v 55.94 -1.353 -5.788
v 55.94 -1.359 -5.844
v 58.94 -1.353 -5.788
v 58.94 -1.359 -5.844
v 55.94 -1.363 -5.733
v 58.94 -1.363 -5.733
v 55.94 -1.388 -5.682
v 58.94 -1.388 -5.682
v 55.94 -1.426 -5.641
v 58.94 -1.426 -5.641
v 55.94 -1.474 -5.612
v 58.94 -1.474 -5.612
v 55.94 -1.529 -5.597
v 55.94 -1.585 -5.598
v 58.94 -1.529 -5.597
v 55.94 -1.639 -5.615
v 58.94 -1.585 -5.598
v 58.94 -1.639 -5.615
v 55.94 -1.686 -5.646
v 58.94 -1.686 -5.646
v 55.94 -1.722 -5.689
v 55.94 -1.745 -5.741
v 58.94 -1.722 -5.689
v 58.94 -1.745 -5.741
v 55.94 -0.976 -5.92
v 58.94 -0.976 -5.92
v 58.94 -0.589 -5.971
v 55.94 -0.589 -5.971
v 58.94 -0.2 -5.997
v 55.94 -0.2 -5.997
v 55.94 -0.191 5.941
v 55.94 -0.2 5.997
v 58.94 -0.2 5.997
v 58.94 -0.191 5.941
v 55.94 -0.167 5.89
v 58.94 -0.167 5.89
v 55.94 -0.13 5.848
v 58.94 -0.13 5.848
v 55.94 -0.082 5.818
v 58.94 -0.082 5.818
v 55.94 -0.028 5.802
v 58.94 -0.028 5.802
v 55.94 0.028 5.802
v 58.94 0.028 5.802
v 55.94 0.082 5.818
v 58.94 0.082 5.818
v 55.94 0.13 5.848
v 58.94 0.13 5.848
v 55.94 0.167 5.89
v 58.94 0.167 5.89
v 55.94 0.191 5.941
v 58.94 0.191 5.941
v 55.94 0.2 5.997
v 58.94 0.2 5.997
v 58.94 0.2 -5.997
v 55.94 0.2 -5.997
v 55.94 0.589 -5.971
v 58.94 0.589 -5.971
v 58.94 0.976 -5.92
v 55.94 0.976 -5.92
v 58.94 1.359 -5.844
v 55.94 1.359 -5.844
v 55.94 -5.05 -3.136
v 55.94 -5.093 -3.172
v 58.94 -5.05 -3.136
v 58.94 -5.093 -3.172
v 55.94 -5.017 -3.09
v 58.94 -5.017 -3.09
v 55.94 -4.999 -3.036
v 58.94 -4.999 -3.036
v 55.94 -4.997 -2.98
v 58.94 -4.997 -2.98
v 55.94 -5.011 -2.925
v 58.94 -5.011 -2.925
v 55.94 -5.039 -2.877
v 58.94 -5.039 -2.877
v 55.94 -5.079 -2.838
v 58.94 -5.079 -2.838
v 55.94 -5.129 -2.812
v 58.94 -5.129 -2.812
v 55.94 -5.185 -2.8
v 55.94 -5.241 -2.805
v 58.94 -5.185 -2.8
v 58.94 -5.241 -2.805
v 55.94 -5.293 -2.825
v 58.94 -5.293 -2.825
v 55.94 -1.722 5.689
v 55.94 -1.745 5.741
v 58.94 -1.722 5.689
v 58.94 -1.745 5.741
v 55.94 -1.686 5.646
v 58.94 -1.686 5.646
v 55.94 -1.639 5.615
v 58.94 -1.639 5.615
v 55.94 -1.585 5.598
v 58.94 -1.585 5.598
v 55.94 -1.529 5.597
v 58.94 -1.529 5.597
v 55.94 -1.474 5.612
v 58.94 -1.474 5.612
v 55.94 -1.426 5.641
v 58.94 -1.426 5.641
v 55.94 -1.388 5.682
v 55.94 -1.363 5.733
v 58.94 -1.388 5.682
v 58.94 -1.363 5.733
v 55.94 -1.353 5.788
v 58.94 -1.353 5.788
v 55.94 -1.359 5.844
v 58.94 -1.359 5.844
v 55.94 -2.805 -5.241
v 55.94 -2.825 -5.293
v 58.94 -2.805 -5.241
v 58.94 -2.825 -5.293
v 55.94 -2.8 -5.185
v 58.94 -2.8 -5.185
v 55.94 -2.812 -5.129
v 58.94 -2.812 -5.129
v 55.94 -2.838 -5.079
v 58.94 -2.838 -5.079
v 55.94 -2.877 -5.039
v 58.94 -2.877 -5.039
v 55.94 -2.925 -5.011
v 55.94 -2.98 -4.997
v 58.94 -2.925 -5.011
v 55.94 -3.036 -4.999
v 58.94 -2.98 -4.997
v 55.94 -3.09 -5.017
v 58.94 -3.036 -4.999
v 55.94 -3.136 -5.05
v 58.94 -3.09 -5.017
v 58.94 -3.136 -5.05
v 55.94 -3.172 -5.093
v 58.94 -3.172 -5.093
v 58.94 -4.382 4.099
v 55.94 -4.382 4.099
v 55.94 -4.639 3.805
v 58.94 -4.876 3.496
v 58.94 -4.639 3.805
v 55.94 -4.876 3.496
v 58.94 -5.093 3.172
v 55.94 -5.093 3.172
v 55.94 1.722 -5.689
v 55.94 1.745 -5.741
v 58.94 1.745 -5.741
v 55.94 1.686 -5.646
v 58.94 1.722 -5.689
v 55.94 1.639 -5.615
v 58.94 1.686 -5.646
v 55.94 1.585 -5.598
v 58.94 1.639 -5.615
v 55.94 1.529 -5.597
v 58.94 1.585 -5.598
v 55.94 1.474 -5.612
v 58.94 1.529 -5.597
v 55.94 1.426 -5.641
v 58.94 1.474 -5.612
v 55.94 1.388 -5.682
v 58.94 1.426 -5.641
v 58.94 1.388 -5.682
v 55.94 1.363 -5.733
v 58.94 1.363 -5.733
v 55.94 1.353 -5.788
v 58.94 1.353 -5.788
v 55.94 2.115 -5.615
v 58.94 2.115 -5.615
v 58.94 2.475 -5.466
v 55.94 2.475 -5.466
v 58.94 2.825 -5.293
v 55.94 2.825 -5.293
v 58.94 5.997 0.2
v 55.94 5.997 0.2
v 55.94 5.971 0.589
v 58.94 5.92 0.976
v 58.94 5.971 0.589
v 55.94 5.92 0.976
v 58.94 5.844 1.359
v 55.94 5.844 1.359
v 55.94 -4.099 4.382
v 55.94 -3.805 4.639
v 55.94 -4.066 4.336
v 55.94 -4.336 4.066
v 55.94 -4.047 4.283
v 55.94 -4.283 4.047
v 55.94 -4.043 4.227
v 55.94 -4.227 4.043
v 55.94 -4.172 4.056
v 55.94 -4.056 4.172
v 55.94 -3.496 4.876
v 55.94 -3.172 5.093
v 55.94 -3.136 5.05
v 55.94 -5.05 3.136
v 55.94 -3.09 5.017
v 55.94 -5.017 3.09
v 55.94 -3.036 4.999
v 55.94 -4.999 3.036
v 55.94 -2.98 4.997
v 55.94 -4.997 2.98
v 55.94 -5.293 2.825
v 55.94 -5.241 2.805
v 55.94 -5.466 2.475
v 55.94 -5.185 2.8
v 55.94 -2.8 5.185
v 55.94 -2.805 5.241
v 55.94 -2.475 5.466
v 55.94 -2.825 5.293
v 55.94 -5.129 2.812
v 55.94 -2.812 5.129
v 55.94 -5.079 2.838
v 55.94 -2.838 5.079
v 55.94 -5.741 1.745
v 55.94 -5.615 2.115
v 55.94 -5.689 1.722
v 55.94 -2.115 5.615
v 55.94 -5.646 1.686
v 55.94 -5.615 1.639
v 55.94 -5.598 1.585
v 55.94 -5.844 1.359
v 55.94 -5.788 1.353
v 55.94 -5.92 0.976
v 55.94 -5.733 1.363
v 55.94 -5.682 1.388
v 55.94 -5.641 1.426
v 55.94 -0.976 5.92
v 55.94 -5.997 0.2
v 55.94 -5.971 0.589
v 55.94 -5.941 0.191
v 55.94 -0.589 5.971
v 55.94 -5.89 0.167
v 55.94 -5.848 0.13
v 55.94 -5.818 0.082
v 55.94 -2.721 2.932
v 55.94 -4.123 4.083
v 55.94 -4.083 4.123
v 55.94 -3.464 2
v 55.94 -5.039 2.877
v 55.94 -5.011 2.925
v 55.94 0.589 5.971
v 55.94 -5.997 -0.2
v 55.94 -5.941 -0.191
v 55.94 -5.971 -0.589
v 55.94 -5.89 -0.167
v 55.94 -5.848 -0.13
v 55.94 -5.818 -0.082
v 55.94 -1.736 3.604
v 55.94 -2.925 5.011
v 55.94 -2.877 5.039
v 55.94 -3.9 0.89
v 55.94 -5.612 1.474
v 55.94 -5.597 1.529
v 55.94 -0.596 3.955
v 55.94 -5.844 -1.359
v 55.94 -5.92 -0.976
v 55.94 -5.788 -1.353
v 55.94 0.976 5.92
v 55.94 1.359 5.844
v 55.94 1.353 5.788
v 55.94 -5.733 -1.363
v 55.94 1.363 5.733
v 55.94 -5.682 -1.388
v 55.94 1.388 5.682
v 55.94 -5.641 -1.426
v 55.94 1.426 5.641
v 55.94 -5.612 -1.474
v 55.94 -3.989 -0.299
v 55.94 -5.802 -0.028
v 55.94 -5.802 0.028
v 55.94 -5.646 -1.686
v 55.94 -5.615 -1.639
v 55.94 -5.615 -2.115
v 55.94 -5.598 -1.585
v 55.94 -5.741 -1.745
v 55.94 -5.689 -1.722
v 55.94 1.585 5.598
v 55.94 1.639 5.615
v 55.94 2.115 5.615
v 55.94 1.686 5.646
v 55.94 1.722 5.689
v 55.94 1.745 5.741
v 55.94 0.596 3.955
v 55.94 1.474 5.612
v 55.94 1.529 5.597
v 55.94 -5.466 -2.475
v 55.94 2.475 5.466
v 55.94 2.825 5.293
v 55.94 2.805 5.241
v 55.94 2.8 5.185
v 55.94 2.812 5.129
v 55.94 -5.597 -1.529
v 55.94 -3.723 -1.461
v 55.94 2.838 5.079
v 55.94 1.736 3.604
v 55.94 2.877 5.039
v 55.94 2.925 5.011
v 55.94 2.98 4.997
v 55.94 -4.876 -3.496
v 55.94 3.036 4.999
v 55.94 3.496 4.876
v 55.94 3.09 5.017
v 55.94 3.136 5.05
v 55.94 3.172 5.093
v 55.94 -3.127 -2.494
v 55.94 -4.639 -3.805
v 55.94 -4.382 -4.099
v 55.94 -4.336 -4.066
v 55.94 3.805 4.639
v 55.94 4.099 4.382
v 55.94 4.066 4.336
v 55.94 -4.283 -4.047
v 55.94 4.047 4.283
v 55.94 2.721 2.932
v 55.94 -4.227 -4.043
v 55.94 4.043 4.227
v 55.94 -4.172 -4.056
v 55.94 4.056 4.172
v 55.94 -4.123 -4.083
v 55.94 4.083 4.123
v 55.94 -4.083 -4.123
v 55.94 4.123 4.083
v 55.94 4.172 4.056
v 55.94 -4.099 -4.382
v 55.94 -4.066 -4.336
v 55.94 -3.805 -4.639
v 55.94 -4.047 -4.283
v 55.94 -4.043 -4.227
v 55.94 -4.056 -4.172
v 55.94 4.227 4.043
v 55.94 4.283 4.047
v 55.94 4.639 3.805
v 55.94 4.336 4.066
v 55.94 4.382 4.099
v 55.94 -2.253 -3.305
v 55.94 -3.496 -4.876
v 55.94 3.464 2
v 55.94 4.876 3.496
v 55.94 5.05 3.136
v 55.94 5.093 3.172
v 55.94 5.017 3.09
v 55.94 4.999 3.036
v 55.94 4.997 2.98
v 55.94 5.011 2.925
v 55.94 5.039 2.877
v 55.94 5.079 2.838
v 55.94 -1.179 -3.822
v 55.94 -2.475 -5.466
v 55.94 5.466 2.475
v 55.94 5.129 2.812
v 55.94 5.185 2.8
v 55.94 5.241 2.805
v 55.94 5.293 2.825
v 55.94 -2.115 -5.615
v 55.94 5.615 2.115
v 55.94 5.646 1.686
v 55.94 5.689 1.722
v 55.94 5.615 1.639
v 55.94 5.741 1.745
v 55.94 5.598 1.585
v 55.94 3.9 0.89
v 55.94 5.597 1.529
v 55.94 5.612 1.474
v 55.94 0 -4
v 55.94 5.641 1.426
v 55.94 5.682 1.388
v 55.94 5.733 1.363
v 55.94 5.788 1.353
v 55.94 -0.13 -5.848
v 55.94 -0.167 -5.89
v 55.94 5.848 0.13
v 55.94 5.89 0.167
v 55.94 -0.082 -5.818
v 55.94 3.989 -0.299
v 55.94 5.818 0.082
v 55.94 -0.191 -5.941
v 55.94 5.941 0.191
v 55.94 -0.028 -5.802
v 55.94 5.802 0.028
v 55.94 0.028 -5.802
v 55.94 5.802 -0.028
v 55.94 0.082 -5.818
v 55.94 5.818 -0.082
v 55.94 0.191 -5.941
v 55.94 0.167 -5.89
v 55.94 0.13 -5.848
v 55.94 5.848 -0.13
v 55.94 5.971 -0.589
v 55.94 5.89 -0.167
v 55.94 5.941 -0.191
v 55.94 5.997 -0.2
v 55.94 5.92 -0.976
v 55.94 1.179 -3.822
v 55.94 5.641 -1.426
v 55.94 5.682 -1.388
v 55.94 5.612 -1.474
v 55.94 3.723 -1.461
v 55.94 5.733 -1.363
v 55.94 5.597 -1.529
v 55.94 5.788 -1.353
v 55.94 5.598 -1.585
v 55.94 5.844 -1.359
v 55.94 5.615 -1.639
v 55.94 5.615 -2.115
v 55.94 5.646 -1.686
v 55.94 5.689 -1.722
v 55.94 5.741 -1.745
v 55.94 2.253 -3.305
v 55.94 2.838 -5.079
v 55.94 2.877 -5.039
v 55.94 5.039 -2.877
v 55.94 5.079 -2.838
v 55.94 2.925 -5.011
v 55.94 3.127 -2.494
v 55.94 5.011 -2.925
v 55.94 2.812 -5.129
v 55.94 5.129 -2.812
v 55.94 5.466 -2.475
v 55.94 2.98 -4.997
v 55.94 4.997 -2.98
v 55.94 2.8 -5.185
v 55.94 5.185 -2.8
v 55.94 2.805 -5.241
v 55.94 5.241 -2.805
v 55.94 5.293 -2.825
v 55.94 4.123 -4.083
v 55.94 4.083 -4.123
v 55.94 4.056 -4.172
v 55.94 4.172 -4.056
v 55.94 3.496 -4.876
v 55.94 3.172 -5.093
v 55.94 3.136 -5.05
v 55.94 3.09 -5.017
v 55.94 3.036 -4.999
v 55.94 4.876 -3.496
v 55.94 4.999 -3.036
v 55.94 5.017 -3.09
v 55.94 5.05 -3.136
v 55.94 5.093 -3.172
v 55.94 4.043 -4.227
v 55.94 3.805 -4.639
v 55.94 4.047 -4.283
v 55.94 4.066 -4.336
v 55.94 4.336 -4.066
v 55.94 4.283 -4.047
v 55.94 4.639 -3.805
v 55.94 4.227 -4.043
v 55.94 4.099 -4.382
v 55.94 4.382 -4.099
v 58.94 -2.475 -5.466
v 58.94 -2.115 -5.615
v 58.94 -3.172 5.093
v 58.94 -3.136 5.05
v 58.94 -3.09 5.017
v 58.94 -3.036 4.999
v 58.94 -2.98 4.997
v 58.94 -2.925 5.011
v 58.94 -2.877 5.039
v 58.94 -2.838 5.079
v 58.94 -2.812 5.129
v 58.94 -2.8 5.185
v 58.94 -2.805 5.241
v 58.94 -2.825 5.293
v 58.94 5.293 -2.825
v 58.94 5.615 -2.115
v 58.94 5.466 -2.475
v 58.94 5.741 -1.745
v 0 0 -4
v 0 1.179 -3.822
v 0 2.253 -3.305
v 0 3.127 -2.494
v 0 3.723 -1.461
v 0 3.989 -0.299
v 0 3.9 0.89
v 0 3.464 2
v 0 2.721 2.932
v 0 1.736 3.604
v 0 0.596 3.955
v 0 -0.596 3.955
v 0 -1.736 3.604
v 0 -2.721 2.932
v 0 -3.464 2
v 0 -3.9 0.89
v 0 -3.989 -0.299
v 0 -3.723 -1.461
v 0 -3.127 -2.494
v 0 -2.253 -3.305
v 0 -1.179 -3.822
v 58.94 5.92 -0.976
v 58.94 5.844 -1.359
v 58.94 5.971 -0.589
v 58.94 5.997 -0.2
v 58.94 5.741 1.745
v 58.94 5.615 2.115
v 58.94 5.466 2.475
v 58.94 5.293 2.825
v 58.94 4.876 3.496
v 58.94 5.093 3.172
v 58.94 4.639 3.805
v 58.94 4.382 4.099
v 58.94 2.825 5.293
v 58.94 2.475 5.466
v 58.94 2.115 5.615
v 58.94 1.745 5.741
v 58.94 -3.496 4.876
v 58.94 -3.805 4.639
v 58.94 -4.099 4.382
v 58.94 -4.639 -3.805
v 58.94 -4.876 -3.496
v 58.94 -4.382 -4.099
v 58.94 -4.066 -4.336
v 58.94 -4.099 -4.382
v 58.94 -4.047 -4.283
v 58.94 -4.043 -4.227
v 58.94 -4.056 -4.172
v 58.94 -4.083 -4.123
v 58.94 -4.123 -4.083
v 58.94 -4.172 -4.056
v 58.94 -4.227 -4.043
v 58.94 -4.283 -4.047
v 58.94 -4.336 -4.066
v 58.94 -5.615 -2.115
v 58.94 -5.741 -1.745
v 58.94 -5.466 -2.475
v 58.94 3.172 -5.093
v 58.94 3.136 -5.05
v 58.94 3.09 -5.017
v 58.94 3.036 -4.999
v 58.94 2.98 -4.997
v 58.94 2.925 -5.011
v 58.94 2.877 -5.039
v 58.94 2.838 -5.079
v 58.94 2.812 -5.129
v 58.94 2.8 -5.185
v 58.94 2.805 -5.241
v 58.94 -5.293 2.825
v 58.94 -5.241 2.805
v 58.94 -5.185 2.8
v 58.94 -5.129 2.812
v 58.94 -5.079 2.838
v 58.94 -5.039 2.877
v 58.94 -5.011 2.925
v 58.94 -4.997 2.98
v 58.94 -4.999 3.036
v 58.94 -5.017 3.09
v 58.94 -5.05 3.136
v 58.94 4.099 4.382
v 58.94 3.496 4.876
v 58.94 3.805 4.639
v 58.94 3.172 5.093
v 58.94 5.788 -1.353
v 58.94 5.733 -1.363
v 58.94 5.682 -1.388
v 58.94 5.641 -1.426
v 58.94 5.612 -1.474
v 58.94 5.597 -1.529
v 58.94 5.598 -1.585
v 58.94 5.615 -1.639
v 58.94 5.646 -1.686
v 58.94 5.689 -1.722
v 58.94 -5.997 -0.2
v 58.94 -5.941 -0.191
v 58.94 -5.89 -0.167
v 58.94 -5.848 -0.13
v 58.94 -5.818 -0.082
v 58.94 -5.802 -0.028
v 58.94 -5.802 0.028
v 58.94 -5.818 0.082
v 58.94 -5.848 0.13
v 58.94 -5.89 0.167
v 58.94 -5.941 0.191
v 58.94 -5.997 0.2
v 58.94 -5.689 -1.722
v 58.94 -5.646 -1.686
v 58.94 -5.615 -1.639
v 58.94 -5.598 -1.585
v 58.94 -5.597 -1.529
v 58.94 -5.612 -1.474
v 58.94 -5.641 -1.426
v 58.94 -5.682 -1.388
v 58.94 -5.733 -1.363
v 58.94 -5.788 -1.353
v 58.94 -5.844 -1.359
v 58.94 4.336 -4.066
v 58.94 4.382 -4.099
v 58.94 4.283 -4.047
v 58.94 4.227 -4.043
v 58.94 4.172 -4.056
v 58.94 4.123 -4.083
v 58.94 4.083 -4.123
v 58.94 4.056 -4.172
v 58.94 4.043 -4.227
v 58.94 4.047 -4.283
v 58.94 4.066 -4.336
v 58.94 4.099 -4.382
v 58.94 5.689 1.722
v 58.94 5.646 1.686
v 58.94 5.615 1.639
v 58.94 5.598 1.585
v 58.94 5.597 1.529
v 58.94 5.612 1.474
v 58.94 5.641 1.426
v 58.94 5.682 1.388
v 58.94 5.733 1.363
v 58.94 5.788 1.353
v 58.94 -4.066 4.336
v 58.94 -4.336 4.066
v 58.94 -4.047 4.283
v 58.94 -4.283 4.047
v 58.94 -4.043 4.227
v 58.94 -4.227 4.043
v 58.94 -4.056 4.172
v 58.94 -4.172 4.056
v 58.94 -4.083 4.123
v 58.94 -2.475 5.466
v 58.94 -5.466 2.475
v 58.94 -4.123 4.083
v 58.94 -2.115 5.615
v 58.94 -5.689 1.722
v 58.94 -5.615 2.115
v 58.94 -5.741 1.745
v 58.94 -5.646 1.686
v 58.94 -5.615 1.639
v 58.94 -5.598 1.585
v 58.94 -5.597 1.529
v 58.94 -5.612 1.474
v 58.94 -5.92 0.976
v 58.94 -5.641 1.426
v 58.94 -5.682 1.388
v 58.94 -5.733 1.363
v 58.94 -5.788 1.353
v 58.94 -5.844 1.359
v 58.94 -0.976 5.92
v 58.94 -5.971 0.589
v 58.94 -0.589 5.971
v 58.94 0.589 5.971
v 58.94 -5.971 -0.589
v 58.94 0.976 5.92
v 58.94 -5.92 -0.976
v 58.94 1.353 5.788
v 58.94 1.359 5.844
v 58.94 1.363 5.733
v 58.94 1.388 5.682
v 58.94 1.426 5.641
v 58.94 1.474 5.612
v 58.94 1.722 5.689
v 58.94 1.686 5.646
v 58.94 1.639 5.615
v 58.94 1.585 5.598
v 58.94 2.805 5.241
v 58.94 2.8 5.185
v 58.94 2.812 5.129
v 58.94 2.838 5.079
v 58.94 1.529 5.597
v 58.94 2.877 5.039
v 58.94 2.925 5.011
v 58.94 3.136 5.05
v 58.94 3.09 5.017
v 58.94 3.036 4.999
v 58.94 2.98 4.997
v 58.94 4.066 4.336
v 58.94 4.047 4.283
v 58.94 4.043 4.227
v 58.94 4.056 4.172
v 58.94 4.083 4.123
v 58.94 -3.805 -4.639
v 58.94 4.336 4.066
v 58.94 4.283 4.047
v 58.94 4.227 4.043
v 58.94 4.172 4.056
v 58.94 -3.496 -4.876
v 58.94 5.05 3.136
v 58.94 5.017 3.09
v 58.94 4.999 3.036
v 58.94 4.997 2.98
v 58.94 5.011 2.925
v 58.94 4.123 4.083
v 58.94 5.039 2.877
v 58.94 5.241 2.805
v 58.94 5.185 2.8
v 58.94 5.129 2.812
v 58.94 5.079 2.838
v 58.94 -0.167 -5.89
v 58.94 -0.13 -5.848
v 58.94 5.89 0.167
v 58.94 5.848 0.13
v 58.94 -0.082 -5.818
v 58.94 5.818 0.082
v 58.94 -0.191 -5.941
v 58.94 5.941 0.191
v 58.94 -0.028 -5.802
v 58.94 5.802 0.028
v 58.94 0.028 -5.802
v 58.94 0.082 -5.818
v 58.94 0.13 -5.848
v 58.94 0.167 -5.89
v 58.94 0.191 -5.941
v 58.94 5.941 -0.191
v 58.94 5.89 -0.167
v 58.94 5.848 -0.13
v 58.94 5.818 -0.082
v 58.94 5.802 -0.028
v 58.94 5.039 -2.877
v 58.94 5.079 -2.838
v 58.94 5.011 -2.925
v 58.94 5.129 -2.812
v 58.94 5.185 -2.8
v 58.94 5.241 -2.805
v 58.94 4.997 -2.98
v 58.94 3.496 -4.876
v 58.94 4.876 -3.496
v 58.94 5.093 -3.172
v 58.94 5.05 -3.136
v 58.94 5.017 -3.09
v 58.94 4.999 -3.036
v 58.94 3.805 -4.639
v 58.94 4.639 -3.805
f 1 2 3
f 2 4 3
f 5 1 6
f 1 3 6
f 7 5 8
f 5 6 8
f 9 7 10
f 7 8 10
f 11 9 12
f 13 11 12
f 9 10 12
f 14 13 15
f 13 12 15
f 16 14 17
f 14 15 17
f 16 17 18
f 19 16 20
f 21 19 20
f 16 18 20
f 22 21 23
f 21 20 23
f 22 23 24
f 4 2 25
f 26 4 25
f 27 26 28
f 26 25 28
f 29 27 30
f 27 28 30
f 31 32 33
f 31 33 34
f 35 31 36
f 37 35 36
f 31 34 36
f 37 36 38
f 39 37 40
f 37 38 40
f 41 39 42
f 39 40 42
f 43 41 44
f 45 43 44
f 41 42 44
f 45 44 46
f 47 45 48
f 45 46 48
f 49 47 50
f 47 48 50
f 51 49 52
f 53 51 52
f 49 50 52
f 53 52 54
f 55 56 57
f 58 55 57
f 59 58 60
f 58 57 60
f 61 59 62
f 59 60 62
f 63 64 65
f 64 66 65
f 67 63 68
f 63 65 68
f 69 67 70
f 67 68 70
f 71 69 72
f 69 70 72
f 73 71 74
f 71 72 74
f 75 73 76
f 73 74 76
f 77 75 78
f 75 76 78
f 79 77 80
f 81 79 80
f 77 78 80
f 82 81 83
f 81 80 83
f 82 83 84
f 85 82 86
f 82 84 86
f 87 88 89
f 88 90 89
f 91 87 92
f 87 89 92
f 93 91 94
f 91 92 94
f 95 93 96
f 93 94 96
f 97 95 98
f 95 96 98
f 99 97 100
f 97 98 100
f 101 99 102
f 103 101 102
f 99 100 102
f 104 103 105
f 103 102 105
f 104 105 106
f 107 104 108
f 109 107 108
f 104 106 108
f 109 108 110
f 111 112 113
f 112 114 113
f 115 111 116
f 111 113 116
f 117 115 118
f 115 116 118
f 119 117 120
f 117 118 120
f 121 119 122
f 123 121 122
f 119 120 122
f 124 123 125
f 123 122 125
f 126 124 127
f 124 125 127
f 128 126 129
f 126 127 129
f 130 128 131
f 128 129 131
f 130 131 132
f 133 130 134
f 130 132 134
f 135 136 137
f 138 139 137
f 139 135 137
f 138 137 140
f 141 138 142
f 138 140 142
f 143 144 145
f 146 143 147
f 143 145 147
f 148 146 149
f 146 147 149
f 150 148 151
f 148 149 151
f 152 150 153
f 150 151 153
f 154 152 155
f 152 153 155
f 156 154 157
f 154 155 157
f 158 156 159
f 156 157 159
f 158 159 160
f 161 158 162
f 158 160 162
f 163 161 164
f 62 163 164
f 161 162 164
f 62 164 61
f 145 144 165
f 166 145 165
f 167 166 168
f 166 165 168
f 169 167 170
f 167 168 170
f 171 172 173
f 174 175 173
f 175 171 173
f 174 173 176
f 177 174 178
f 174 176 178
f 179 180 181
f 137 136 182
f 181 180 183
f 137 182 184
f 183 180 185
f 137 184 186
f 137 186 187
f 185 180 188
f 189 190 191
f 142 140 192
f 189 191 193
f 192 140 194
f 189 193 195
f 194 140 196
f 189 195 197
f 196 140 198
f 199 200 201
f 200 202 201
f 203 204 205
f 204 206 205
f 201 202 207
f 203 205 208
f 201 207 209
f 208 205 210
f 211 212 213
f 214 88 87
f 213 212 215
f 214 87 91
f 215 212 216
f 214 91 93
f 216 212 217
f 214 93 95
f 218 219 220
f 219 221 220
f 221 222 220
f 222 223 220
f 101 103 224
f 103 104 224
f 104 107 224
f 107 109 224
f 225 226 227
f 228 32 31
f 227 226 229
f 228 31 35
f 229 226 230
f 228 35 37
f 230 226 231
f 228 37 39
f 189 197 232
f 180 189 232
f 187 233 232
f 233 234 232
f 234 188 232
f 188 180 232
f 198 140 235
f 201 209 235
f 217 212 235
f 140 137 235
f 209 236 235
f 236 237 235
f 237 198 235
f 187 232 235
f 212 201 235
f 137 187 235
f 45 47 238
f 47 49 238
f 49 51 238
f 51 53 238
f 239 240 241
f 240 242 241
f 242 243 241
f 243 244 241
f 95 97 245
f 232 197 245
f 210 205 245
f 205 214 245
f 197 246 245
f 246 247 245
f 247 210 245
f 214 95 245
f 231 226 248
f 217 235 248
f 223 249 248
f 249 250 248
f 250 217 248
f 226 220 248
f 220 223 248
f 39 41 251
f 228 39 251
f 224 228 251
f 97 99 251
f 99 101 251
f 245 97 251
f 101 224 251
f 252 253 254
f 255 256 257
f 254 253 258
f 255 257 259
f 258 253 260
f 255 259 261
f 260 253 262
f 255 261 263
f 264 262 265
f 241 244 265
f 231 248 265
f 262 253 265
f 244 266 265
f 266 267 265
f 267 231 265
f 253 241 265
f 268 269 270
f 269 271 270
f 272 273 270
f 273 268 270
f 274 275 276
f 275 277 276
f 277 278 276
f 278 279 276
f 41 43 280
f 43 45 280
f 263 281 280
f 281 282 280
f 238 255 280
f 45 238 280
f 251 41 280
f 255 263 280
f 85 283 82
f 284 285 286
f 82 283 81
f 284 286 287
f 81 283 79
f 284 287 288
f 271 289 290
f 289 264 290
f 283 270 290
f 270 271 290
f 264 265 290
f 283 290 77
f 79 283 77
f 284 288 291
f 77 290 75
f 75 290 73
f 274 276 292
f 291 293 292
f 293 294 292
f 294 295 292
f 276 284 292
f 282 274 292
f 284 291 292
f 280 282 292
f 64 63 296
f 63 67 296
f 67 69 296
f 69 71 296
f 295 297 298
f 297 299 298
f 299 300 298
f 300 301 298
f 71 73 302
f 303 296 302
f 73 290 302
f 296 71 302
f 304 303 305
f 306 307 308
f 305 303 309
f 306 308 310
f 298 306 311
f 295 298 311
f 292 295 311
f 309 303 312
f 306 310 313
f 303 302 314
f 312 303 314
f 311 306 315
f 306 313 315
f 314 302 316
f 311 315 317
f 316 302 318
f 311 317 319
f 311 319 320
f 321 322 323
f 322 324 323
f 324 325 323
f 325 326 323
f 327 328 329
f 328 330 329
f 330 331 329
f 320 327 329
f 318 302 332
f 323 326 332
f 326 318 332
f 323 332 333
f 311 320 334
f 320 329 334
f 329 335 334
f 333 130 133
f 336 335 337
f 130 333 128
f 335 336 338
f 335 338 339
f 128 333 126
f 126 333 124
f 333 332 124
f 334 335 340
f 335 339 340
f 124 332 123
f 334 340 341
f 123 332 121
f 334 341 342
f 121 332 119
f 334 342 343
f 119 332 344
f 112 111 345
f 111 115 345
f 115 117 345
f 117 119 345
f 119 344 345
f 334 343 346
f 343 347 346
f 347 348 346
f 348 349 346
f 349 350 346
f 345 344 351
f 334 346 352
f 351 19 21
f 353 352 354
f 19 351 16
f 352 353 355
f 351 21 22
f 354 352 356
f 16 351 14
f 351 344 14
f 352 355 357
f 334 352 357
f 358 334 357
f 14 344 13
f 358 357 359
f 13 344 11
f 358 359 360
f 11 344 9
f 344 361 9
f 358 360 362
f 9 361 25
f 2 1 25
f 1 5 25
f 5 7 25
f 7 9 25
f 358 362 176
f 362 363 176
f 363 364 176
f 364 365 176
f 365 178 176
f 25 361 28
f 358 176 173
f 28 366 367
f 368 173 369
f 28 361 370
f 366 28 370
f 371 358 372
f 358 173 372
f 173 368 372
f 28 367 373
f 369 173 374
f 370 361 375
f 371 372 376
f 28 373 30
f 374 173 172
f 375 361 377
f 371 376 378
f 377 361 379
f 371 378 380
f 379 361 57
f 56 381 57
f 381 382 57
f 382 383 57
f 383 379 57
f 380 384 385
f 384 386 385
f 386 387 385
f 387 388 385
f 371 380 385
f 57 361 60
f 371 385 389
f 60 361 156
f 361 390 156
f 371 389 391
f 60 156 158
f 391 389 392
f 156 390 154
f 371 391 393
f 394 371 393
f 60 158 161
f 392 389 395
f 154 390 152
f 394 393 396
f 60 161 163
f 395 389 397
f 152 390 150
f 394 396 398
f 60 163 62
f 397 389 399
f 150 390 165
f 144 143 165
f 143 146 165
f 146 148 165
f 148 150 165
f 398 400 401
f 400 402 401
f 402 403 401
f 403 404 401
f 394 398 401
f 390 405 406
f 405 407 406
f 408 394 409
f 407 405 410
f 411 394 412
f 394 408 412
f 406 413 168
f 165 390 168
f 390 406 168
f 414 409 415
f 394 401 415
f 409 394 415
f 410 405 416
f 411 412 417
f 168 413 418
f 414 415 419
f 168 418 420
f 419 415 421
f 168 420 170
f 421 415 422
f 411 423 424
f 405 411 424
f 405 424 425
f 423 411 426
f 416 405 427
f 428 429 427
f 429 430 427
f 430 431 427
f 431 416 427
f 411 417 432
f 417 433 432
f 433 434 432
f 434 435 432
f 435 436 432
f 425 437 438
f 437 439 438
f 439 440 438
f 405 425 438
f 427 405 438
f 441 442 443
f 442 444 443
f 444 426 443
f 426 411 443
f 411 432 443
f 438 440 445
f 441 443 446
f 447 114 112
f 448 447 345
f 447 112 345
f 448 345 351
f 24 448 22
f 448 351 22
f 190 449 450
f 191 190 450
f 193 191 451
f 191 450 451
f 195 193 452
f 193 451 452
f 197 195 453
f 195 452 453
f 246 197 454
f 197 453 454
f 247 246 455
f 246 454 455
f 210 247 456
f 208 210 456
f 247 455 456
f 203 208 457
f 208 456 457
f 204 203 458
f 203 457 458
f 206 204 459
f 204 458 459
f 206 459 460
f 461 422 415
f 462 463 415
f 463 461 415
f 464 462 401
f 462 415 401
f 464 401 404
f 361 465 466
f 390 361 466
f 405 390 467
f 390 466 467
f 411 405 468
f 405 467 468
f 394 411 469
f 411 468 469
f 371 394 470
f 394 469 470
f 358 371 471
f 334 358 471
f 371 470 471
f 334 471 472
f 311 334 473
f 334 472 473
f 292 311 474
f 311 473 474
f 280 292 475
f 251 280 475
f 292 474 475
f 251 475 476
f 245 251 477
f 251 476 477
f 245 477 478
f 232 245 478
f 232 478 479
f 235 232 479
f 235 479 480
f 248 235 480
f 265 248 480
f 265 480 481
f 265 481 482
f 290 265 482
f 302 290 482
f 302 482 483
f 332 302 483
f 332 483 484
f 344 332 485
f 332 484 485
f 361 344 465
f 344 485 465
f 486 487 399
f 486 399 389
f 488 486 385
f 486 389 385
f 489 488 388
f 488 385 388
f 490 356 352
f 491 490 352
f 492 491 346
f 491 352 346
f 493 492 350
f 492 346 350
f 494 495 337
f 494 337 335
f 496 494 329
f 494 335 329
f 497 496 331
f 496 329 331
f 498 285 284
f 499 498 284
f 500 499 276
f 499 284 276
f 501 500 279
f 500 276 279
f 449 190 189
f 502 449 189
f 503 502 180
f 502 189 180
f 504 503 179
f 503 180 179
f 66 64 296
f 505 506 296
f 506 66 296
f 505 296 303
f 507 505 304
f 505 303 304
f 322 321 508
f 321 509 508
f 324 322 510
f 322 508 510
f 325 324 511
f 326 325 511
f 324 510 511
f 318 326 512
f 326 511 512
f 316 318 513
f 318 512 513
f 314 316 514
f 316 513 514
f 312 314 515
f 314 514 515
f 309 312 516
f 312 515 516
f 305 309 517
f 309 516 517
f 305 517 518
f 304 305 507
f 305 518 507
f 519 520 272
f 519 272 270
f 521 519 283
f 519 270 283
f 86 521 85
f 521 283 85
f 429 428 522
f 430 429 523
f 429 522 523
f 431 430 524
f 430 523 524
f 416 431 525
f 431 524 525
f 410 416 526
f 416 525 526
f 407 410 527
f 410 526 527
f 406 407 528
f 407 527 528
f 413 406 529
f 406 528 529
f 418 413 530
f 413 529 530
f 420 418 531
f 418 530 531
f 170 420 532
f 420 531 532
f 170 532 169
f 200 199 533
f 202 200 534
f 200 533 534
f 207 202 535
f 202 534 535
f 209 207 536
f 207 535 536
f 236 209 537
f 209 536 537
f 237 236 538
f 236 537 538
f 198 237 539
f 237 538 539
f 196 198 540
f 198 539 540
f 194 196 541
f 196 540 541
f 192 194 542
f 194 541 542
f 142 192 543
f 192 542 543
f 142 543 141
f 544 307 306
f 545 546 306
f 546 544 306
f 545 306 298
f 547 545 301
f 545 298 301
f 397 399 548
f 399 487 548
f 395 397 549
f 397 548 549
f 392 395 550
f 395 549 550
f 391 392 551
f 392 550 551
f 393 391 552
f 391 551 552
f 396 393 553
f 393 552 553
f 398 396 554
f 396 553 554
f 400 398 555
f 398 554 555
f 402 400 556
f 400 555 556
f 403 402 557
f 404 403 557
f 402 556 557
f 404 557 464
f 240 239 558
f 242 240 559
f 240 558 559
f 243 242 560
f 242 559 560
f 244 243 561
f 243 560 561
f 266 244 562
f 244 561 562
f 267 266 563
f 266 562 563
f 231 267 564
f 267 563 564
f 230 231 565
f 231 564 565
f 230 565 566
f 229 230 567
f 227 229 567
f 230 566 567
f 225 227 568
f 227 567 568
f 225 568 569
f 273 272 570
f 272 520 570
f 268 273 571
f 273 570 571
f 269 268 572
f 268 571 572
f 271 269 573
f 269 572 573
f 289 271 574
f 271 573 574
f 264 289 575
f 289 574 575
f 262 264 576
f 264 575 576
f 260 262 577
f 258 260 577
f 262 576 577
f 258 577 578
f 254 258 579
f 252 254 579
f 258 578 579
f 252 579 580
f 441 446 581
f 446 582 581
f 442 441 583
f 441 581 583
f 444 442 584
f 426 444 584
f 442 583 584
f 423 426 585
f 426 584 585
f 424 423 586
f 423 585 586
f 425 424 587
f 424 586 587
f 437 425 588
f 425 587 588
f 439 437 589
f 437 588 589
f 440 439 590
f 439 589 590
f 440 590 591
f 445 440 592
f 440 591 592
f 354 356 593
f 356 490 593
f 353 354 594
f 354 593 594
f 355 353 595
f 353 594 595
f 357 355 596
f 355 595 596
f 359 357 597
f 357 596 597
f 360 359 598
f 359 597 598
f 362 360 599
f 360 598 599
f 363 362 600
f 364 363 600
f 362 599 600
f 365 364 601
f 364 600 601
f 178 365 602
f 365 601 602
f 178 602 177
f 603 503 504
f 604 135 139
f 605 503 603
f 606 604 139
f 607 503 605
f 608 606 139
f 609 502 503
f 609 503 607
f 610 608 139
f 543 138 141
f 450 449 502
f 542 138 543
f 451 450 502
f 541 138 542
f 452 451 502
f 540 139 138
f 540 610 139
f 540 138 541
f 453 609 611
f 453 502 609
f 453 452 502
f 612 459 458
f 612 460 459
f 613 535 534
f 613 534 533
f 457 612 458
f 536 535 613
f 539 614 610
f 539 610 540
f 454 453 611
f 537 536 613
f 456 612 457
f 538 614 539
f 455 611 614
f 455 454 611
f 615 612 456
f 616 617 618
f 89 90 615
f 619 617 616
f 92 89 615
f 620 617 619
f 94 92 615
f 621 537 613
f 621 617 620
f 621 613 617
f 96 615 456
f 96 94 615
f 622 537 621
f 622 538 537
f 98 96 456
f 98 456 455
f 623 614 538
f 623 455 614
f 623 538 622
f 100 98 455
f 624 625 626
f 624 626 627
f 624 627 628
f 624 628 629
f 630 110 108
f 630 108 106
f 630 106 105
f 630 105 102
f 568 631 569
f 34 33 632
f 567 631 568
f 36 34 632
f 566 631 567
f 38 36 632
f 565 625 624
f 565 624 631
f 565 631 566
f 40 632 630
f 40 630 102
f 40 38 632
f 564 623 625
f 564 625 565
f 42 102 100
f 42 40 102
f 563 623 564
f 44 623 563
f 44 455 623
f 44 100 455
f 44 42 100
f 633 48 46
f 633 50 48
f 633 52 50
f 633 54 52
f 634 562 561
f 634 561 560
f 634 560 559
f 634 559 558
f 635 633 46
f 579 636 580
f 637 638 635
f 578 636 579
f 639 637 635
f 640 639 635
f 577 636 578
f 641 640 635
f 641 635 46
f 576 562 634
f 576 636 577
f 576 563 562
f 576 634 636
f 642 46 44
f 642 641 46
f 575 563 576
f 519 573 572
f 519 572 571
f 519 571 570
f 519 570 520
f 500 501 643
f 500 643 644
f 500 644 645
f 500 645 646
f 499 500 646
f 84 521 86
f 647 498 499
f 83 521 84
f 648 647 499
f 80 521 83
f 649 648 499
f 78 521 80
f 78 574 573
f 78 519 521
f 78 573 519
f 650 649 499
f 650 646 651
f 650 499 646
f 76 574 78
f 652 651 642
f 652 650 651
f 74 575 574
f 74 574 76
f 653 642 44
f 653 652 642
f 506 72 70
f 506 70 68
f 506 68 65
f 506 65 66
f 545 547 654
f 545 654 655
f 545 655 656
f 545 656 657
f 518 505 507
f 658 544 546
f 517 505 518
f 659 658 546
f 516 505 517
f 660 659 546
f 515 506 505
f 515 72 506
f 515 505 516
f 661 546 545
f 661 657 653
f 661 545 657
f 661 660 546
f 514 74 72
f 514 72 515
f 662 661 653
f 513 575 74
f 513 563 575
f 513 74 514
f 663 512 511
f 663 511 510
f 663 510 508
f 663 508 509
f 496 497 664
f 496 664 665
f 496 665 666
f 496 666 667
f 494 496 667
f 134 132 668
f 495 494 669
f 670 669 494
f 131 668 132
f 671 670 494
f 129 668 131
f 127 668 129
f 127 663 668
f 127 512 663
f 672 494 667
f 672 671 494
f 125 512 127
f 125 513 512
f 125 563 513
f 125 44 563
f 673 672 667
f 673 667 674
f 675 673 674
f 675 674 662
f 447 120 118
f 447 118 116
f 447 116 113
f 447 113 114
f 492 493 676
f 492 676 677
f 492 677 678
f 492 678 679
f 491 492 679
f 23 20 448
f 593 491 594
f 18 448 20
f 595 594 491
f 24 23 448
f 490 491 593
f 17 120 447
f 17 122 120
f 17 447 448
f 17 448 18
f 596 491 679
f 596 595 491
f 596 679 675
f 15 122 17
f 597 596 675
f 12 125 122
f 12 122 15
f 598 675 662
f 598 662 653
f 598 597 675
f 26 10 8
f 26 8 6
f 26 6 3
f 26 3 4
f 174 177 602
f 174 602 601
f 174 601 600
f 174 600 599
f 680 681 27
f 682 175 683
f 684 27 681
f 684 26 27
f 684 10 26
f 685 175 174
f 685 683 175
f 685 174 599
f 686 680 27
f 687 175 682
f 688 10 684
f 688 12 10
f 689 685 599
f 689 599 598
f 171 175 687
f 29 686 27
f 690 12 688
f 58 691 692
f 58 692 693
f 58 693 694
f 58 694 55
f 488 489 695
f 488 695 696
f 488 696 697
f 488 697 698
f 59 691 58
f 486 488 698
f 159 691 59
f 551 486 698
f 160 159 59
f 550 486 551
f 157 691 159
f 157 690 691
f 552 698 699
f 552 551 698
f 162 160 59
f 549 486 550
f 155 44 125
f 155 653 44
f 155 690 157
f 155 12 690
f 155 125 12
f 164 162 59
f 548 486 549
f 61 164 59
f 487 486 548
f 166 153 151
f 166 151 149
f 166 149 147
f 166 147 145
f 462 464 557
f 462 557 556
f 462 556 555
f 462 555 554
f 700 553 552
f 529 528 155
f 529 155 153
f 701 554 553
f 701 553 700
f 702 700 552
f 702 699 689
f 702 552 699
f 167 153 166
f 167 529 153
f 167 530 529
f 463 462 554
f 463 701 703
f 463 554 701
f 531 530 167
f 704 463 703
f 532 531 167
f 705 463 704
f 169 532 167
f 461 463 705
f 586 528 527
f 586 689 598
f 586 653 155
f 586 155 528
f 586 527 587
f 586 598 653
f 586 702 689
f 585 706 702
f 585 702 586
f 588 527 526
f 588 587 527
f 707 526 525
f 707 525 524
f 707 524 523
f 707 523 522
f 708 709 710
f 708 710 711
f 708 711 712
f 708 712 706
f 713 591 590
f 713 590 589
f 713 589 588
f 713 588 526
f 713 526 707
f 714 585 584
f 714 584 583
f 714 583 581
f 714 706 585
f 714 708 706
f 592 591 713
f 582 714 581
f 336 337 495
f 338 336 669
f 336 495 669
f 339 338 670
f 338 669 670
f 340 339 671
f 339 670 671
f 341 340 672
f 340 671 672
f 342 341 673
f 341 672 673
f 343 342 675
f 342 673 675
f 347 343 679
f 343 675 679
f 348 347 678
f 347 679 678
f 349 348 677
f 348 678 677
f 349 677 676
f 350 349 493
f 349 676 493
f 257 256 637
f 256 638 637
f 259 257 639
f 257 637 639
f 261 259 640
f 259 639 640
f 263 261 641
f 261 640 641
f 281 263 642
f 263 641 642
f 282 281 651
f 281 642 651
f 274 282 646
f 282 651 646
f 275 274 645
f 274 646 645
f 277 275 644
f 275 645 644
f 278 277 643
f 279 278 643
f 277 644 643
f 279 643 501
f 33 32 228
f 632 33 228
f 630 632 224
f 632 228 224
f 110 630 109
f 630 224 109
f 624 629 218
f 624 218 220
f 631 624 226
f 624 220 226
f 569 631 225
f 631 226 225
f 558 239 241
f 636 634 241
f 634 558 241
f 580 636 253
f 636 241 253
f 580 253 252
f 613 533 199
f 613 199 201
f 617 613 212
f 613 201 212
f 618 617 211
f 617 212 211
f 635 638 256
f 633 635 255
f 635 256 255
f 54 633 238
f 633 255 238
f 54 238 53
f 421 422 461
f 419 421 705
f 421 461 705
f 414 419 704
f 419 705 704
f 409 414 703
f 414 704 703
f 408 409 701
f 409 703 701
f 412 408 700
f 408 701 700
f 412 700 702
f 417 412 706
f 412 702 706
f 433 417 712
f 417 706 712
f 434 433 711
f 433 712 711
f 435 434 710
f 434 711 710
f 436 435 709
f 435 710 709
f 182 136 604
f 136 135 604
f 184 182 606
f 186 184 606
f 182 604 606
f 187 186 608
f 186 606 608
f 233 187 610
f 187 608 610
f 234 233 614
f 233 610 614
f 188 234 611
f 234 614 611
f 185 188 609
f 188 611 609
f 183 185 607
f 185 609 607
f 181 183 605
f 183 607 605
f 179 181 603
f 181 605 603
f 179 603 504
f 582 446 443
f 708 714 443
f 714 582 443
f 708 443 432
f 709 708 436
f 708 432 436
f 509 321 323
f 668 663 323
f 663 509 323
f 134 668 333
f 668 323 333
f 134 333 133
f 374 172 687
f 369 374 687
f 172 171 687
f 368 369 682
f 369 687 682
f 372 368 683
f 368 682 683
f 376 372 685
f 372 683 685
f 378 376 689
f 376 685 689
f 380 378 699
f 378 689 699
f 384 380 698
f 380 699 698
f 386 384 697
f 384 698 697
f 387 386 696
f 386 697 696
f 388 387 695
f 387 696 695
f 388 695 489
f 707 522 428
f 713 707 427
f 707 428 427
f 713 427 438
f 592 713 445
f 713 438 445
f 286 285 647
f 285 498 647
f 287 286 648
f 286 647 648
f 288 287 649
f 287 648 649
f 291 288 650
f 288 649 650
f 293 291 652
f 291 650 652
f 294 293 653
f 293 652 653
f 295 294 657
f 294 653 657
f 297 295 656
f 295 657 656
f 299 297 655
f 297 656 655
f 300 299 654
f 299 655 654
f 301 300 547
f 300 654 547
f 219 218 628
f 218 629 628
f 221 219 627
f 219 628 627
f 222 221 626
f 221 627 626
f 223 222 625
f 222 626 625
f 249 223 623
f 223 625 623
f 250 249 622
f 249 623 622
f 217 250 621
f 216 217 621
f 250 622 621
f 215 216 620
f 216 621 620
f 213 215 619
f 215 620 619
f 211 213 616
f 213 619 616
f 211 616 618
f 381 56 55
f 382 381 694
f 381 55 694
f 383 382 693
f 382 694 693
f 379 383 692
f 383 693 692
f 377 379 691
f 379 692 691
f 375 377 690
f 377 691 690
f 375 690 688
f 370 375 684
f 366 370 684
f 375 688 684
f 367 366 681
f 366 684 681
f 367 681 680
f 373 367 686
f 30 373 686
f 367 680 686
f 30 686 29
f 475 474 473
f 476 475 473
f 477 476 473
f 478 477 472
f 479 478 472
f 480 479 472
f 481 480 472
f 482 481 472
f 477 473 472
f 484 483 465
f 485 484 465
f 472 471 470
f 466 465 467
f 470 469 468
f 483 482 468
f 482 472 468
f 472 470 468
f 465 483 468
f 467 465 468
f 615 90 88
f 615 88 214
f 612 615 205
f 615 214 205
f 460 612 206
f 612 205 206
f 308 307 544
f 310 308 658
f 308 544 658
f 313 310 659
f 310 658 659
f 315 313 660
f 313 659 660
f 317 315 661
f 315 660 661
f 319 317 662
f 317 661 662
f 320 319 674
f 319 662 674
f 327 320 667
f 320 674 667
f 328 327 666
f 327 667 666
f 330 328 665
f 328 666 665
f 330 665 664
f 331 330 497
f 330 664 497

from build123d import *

# Parameters (mm, degrees)
SKETCH1_R           = 4
BOSS_EXTRUDE1_DEPTH = 55.94
SKETCH2_R           = 6
BOSS_EXTRUDE2_DEPTH = 3
SKETCH3_R           = 0.2
CUT_EXTRUDE1_DEPTH  = 3
CIRPATTERN1_COUNT   = 24


with BuildPart() as part:
    # Sketch1 → Boss-Extrude1 (new body)
    with BuildSketch(Plane(origin=(0, 0, 0), x_dir=(0, 0, -1), z_dir=(1, 0, 0))):
        Circle(SKETCH1_R)
    extrude(amount=BOSS_EXTRUDE1_DEPTH)

    # Sketch2 → Boss-Extrude2 (add)
    with BuildSketch(Plane(origin=(55.94, 0, 0), x_dir=(0, 0, -1), z_dir=(1, 0, 0))):
        Circle(SKETCH2_R)
    extrude(amount=BOSS_EXTRUDE2_DEPTH)

    # Sketch3 → Cut-Extrude1 (cut)
    with BuildSketch(Plane(origin=(58.94, 0, 0), x_dir=(0, 0, -1), z_dir=(1, 0, 0))):
        with Locations((-6, 0)):
            Circle(SKETCH3_R)
    cut_extrude1 = extrude(amount=-CUT_EXTRUDE1_DEPTH, mode=Mode.SUBTRACT)

    # CirPattern1: Cut-Extrude1 ×24 about axis
    cirpattern1_axis = Axis((0, 0, 0), (1, 0, 0))
    for i in range(1, CIRPATTERN1_COUNT):
        add(cut_extrude1.rotate(cirpattern1_axis, i * 360 / CIRPATTERN1_COUNT), mode=Mode.SUBTRACT)


solid = part.part
